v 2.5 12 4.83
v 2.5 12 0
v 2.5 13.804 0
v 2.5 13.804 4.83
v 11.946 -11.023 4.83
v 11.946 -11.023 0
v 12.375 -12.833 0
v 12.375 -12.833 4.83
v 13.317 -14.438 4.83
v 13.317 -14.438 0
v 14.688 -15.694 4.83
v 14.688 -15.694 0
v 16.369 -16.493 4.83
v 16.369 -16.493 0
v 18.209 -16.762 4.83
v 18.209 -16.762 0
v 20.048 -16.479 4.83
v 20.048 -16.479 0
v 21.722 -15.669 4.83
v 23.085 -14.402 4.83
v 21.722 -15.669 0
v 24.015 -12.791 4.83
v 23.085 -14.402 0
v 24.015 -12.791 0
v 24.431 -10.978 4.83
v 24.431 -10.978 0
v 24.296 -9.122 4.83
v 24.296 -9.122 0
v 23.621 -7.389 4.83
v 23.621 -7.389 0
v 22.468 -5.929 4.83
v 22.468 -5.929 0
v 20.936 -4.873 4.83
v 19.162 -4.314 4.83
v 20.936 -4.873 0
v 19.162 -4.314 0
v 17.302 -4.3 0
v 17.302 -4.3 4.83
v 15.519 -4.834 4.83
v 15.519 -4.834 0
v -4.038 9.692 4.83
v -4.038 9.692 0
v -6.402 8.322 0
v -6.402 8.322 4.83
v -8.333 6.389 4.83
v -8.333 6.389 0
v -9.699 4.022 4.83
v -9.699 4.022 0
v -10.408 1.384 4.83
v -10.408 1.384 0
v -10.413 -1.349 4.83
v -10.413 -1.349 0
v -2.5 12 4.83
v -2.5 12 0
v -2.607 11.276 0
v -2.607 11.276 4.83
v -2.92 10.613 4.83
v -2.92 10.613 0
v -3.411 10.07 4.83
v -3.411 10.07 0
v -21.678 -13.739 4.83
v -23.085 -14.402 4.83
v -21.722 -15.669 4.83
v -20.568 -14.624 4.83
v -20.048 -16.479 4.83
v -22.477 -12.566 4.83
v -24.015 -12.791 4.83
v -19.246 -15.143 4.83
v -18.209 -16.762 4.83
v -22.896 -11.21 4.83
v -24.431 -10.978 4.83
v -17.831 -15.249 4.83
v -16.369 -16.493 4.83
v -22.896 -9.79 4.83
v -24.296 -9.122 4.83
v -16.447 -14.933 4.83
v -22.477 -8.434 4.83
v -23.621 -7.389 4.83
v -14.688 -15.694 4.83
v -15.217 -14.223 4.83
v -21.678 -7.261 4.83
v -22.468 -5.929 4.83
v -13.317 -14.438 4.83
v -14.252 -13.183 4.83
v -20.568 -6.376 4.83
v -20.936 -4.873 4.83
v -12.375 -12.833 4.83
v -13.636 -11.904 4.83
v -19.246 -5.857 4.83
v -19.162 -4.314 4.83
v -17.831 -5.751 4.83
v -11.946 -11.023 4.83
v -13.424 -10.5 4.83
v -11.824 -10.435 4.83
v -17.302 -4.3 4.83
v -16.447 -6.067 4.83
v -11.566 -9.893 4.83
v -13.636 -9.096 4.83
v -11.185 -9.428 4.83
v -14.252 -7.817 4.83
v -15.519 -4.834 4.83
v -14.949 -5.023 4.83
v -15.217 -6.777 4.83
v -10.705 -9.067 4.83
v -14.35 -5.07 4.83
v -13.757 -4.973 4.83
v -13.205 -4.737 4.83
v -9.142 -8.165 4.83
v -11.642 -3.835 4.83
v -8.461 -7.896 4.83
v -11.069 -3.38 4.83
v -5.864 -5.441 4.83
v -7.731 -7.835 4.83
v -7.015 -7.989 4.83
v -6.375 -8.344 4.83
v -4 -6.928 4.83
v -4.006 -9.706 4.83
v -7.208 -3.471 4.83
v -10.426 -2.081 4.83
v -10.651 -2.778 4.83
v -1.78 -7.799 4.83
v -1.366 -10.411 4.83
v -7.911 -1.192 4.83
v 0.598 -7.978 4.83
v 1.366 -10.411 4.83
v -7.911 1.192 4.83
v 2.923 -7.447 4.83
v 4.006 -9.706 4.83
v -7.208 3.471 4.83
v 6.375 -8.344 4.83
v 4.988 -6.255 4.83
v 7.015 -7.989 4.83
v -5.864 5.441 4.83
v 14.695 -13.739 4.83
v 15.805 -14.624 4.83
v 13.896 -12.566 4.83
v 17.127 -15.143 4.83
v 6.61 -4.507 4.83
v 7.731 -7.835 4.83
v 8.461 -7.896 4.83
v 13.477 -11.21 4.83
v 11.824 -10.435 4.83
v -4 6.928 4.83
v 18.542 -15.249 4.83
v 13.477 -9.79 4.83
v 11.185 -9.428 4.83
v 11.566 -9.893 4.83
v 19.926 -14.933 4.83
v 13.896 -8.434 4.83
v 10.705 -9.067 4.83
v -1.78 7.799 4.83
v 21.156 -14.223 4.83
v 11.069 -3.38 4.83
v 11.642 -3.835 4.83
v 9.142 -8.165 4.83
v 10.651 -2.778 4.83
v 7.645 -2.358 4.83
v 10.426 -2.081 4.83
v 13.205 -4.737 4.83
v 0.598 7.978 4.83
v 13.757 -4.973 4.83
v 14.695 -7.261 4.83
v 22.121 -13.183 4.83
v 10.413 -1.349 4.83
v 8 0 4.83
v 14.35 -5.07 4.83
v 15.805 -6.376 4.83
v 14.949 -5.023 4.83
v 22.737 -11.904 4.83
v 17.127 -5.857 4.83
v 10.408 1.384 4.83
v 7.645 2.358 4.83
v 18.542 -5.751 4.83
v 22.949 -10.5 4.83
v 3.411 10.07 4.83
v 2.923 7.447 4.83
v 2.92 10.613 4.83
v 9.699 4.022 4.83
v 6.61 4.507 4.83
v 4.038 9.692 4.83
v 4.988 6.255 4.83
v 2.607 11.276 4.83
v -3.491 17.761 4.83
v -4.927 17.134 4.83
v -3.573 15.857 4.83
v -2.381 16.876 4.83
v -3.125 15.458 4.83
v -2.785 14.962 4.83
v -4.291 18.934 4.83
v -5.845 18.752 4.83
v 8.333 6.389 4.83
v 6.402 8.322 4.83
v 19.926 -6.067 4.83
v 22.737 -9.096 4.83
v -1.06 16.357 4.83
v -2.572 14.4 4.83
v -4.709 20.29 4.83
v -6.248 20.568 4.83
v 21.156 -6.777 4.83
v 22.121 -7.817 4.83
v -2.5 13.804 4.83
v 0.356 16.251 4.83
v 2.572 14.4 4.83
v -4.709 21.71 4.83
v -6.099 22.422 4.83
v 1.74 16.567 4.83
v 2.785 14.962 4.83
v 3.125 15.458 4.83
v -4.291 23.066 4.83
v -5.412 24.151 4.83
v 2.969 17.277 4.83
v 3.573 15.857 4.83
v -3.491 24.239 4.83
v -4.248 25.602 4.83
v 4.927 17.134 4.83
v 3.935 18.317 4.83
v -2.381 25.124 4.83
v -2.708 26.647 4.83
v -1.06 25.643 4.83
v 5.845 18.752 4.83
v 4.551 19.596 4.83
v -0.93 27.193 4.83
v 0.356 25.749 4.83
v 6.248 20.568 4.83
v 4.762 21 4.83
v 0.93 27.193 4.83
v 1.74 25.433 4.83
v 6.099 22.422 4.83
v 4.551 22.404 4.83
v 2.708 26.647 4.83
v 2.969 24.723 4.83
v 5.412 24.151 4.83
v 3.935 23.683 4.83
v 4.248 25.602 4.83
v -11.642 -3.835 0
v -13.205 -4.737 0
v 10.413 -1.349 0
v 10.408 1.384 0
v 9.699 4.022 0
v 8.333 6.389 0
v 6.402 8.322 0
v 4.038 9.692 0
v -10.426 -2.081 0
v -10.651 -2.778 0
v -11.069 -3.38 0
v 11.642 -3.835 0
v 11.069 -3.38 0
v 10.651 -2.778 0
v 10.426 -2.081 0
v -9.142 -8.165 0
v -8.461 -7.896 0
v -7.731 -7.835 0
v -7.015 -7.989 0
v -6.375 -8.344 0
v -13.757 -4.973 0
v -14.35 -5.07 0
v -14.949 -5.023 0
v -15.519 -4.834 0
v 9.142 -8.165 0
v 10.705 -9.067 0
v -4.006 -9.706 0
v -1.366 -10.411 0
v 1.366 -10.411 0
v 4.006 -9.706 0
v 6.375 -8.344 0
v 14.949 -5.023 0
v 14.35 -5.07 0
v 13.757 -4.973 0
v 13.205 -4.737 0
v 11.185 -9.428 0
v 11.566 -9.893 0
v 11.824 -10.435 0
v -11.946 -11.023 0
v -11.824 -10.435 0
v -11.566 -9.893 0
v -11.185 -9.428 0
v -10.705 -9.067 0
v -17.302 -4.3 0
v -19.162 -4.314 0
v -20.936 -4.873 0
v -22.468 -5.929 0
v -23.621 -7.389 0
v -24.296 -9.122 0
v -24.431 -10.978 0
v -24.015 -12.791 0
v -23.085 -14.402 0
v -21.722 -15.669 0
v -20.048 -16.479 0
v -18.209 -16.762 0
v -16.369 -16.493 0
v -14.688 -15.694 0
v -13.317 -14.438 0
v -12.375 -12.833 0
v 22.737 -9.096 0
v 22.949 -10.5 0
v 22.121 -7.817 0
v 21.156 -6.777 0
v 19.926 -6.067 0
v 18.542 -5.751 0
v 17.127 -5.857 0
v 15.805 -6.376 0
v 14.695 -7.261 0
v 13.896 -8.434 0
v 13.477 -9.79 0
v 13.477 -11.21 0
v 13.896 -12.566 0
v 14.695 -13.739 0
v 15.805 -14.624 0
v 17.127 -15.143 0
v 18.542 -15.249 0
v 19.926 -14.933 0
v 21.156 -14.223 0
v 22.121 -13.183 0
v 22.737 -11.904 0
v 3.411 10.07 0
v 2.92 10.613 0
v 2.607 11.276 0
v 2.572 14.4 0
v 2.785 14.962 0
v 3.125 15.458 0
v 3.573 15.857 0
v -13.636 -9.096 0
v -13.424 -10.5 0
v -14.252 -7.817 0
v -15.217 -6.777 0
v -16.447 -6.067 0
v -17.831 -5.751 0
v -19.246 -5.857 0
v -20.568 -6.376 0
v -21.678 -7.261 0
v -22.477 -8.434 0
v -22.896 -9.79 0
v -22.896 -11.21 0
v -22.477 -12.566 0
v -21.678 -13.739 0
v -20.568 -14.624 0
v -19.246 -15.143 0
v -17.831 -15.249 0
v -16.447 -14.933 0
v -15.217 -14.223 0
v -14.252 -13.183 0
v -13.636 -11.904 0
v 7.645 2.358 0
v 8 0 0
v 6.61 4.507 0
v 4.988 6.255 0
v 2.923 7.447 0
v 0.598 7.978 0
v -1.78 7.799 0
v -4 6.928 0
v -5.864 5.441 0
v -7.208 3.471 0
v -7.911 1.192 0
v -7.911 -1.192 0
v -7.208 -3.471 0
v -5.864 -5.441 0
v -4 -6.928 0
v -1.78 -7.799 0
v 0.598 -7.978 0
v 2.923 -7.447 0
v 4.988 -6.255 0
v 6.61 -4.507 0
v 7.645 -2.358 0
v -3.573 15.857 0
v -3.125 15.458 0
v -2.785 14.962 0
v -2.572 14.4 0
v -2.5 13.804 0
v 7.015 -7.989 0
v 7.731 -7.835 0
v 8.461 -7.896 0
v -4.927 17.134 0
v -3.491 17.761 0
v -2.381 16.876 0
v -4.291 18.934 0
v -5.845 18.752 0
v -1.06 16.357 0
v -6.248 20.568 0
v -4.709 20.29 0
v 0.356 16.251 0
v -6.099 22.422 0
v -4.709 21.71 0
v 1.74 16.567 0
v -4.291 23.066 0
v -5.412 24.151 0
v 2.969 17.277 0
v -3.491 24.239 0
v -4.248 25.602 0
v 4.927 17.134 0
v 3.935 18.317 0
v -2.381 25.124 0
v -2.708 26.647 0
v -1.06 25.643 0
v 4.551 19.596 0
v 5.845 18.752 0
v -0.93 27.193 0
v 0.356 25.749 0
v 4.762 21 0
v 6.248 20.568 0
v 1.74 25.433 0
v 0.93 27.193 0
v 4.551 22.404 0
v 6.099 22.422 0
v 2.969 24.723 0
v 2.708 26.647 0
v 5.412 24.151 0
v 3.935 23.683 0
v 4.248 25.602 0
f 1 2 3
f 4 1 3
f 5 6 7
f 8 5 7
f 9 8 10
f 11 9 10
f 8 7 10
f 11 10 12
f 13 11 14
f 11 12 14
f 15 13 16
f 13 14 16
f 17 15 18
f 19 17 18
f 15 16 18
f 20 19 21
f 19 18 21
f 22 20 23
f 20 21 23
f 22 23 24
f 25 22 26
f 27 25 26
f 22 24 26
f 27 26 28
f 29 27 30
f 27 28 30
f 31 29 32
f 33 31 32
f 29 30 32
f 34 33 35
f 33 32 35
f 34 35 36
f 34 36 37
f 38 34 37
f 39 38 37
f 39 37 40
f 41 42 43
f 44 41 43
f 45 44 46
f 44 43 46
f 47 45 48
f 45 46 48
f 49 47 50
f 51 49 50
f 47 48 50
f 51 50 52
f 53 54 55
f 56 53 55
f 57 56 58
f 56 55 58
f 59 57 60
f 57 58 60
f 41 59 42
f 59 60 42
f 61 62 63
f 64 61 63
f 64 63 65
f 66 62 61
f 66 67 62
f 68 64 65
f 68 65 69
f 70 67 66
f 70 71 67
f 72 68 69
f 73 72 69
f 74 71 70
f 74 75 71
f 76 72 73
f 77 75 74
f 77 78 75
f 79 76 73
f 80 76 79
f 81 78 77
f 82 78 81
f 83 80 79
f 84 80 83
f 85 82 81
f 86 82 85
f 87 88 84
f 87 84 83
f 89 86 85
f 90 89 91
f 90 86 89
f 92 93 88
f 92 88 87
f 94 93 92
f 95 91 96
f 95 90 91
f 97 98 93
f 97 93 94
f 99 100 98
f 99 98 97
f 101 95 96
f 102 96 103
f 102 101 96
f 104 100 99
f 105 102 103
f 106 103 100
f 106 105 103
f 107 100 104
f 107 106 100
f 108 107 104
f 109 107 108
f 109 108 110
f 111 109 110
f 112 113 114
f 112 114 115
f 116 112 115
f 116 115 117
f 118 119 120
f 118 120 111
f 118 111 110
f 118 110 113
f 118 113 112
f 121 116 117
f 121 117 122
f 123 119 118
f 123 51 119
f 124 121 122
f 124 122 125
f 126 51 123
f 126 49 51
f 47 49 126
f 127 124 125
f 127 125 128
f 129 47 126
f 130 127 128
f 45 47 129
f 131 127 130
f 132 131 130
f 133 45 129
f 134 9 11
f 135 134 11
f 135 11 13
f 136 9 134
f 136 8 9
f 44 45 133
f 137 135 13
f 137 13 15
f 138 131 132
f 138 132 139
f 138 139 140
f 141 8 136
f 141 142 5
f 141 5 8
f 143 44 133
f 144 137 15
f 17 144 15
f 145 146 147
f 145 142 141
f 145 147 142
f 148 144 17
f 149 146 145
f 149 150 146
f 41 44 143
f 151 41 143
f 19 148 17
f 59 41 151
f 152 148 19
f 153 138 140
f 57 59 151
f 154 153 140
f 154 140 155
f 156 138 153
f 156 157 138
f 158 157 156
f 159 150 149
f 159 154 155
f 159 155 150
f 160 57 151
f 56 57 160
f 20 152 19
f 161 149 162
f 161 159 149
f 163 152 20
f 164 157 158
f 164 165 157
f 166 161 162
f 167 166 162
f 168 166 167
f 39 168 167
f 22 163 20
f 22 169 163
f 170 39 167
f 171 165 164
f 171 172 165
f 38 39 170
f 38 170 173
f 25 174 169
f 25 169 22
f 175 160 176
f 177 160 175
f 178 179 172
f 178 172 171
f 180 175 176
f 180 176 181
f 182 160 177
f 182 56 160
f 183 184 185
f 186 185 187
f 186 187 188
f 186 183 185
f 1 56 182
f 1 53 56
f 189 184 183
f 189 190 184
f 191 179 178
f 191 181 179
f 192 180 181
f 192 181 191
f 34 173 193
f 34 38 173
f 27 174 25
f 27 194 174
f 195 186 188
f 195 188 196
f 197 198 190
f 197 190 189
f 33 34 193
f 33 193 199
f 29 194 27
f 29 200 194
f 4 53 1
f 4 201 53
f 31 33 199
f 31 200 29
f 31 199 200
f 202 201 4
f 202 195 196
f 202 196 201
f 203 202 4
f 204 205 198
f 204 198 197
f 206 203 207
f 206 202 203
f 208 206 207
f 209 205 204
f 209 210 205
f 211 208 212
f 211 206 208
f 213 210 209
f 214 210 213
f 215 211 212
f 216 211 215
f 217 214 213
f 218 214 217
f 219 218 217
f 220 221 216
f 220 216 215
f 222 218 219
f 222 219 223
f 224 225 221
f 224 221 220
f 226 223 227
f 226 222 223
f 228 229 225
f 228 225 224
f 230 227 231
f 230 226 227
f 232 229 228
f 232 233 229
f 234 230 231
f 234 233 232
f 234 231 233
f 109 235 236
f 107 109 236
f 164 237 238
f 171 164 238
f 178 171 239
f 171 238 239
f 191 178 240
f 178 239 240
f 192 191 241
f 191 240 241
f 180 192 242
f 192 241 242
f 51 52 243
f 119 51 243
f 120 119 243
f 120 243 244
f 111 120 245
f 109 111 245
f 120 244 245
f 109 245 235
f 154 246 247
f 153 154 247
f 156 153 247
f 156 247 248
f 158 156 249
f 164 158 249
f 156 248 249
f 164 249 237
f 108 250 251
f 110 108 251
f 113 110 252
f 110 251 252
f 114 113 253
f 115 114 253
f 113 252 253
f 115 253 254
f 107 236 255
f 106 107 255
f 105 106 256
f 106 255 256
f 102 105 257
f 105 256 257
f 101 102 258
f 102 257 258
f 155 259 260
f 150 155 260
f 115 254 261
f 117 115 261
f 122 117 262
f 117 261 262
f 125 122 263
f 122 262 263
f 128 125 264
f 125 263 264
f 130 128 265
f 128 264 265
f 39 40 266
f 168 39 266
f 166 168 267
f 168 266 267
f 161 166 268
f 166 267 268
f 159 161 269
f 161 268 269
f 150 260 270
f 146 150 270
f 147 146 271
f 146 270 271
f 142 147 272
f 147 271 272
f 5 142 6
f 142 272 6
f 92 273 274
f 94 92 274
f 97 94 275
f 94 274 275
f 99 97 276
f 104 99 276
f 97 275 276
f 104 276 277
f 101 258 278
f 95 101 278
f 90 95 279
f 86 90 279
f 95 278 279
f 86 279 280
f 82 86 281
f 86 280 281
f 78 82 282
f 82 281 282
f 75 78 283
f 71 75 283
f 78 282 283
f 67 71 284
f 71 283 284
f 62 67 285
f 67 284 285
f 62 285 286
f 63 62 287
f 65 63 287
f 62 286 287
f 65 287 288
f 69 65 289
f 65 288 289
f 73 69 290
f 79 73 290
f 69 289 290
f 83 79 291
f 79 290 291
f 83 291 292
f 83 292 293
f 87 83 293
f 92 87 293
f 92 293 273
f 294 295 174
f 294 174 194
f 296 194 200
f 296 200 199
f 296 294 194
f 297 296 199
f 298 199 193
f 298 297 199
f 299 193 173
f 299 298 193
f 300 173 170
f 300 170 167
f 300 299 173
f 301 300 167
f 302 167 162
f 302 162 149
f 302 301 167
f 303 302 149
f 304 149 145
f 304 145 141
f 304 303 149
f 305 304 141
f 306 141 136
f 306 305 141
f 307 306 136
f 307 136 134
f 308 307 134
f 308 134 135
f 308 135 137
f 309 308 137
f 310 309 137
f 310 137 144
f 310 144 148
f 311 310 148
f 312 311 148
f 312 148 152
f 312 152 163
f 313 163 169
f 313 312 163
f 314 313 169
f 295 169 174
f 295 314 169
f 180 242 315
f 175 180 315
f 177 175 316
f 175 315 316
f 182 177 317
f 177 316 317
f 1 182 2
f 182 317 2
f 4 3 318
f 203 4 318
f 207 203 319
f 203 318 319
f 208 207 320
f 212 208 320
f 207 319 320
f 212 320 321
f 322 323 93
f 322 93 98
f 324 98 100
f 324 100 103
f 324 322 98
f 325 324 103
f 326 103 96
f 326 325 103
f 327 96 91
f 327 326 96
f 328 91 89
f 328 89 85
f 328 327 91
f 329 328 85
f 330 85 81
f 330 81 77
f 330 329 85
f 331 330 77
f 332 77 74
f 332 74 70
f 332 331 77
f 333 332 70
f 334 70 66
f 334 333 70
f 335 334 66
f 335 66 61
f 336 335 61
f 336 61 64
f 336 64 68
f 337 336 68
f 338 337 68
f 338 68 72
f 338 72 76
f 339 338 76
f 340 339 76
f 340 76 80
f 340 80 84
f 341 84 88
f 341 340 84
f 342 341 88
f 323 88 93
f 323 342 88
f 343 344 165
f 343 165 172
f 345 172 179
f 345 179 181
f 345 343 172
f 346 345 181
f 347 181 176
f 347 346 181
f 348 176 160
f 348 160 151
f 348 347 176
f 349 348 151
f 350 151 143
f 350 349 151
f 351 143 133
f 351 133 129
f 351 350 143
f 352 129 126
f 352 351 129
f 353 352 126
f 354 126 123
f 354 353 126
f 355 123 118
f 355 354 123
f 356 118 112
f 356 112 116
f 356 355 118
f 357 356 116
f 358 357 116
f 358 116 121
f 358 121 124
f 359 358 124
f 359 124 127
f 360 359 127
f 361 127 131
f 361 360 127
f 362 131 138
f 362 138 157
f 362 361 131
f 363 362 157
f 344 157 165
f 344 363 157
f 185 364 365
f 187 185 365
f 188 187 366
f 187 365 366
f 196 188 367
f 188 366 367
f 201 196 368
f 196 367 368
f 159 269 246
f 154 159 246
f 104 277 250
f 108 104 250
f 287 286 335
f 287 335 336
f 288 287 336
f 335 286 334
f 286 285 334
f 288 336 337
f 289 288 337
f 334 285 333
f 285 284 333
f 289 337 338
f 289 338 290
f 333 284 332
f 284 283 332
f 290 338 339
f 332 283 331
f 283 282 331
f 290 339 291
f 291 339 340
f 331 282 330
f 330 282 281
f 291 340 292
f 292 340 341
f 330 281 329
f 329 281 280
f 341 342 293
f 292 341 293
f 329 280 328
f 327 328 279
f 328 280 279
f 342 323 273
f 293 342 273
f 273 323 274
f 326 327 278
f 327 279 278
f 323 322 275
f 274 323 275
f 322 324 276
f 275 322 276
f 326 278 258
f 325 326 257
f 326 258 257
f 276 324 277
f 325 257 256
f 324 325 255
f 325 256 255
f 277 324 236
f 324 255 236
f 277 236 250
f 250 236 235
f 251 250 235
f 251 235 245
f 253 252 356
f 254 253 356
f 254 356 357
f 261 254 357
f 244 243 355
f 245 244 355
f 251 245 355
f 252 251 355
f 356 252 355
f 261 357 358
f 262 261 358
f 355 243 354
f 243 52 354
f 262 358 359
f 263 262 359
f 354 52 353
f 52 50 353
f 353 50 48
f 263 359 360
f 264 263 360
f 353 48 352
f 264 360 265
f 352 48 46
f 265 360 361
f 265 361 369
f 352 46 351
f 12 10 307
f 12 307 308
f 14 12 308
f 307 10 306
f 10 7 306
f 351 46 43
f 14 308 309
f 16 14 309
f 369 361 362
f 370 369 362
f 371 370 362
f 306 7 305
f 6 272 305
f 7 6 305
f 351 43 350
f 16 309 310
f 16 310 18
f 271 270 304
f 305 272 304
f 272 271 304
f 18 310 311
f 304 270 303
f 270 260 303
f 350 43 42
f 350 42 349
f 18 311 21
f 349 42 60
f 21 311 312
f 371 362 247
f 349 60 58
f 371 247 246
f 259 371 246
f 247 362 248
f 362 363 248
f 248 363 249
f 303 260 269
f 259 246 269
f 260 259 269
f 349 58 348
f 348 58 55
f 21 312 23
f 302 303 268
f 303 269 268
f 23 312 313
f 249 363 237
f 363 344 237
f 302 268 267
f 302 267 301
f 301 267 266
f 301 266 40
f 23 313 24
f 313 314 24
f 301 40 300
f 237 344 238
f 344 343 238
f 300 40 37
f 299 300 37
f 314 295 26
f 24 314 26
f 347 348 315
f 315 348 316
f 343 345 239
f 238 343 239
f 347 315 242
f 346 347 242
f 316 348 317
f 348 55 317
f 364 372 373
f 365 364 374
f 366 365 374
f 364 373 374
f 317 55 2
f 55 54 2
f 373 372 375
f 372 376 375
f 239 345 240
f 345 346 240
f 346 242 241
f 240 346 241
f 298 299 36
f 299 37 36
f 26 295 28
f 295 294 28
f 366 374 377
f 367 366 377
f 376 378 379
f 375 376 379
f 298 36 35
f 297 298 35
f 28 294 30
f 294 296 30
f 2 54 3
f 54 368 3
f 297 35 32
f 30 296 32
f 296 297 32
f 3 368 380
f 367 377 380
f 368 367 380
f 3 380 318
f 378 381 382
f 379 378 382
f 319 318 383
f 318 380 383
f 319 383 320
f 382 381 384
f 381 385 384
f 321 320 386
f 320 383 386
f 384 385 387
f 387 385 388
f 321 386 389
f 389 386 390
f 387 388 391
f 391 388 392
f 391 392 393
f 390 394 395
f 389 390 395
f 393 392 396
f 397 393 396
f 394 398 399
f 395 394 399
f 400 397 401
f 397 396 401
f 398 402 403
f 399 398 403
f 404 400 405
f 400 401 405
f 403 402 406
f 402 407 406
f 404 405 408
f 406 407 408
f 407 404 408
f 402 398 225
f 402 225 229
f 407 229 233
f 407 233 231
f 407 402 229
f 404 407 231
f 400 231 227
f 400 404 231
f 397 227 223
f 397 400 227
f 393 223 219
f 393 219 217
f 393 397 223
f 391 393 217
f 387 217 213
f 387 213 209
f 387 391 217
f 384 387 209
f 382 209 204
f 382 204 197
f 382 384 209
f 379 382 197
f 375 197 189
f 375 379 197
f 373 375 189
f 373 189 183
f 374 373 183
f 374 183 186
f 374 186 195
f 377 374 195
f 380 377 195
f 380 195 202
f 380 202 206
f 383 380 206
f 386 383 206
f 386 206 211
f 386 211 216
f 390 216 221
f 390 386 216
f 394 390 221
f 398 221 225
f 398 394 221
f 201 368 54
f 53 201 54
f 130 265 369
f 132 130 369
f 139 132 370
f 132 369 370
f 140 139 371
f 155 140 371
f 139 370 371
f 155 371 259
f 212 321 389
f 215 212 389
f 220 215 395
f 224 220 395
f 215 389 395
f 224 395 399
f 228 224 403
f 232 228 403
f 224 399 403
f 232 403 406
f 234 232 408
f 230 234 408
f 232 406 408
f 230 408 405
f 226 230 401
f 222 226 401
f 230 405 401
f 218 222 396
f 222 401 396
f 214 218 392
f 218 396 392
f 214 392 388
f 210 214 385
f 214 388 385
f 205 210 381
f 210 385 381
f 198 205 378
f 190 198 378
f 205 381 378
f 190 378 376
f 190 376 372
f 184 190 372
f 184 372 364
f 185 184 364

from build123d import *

# Parameters (mm, degrees)
F0_R     = 4.7625
F0_R_2   = 8
F1_DEPTH = 4.83


with BuildPart() as f1:
    # F0 (on Top) → F1 (new body)
    with BuildSketch(Plane.XY):
        with BuildLine():
            ThreePointArc((2.5, 13.80407), (2.784562, 14.962445), (3.573466, 15.857117))
            ThreePointArc((3.573466, 15.857117), (0, 27.2625), (-3.573466, 15.857117))
            ThreePointArc((-3.573466, 15.857117), (-2.784562, 14.962445), (-2.5, 13.80407))
            Line((-2.5, 13.80407), (-2.5, 12))
            ThreePointArc((-2.5, 12), (-2.919874, 10.61325), (-4.038462, 9.692308))
            ThreePointArc((-4.038462, 9.692308), (-9.093267, 5.25), (-10.413015, -1.348744))
            ThreePointArc((-10.413015, -1.348744), (-10.651281, -2.777939), (-11.642305, -3.834936))
            Line((-11.642305, -3.834936), (-13.204675, -4.736972))
            ThreePointArc((-13.204675, -4.736972), (-14.350139, -5.069722), (-15.5194, -4.833846))
            ThreePointArc((-15.5194, -4.833846), (-23.610018, -13.63125), (-11.945933, -11.023271))
            ThreePointArc((-11.945933, -11.023271), (-11.565577, -9.892724), (-10.704675, -9.067099))
            Line((-10.704675, -9.067099), (-9.142305, -8.165064))
            ThreePointArc((-9.142305, -8.165064), (-7.731407, -7.83531), (-6.374554, -8.343564))
            ThreePointArc((-6.374554, -8.343564), (0, -10.5), (6.374554, -8.343564))
            ThreePointArc((6.374554, -8.343564), (7.731407, -7.83531), (9.142305, -8.165064))
            Line((9.142305, -8.165064), (10.704675, -9.067099))
            ThreePointArc((10.704675, -9.067099), (11.565577, -9.892724), (11.945933, -11.023271))
            ThreePointArc((11.945933, -11.023271), (23.610018, -13.63125), (15.5194, -4.833846))
            ThreePointArc((15.5194, -4.833846), (14.350139, -5.069722), (13.204675, -4.736972))
            Line((13.204675, -4.736972), (11.642305, -3.834936))
            ThreePointArc((11.642305, -3.834936), (10.651281, -2.777939), (10.413015, -1.348744))
            ThreePointArc((10.413015, -1.348744), (9.093267, 5.25), (4.038462, 9.692308))
            ThreePointArc((4.038462, 9.692308), (2.919874, 10.61325), (2.5, 12))
            Line((2.5, 12), (2.5, 13.80407))
        make_face()
        with Locations((-18.186533, -10.5)):
            Circle(F0_R, mode=Mode.SUBTRACT)
        with Locations((18.186533, -10.5)):
            Circle(F0_R, mode=Mode.SUBTRACT)
        Circle(F0_R_2, mode=Mode.SUBTRACT)
        with Locations((0, 21)):
            Circle(F0_R, mode=Mode.SUBTRACT)
    extrude(amount=F1_DEPTH)


solid = f1.part
